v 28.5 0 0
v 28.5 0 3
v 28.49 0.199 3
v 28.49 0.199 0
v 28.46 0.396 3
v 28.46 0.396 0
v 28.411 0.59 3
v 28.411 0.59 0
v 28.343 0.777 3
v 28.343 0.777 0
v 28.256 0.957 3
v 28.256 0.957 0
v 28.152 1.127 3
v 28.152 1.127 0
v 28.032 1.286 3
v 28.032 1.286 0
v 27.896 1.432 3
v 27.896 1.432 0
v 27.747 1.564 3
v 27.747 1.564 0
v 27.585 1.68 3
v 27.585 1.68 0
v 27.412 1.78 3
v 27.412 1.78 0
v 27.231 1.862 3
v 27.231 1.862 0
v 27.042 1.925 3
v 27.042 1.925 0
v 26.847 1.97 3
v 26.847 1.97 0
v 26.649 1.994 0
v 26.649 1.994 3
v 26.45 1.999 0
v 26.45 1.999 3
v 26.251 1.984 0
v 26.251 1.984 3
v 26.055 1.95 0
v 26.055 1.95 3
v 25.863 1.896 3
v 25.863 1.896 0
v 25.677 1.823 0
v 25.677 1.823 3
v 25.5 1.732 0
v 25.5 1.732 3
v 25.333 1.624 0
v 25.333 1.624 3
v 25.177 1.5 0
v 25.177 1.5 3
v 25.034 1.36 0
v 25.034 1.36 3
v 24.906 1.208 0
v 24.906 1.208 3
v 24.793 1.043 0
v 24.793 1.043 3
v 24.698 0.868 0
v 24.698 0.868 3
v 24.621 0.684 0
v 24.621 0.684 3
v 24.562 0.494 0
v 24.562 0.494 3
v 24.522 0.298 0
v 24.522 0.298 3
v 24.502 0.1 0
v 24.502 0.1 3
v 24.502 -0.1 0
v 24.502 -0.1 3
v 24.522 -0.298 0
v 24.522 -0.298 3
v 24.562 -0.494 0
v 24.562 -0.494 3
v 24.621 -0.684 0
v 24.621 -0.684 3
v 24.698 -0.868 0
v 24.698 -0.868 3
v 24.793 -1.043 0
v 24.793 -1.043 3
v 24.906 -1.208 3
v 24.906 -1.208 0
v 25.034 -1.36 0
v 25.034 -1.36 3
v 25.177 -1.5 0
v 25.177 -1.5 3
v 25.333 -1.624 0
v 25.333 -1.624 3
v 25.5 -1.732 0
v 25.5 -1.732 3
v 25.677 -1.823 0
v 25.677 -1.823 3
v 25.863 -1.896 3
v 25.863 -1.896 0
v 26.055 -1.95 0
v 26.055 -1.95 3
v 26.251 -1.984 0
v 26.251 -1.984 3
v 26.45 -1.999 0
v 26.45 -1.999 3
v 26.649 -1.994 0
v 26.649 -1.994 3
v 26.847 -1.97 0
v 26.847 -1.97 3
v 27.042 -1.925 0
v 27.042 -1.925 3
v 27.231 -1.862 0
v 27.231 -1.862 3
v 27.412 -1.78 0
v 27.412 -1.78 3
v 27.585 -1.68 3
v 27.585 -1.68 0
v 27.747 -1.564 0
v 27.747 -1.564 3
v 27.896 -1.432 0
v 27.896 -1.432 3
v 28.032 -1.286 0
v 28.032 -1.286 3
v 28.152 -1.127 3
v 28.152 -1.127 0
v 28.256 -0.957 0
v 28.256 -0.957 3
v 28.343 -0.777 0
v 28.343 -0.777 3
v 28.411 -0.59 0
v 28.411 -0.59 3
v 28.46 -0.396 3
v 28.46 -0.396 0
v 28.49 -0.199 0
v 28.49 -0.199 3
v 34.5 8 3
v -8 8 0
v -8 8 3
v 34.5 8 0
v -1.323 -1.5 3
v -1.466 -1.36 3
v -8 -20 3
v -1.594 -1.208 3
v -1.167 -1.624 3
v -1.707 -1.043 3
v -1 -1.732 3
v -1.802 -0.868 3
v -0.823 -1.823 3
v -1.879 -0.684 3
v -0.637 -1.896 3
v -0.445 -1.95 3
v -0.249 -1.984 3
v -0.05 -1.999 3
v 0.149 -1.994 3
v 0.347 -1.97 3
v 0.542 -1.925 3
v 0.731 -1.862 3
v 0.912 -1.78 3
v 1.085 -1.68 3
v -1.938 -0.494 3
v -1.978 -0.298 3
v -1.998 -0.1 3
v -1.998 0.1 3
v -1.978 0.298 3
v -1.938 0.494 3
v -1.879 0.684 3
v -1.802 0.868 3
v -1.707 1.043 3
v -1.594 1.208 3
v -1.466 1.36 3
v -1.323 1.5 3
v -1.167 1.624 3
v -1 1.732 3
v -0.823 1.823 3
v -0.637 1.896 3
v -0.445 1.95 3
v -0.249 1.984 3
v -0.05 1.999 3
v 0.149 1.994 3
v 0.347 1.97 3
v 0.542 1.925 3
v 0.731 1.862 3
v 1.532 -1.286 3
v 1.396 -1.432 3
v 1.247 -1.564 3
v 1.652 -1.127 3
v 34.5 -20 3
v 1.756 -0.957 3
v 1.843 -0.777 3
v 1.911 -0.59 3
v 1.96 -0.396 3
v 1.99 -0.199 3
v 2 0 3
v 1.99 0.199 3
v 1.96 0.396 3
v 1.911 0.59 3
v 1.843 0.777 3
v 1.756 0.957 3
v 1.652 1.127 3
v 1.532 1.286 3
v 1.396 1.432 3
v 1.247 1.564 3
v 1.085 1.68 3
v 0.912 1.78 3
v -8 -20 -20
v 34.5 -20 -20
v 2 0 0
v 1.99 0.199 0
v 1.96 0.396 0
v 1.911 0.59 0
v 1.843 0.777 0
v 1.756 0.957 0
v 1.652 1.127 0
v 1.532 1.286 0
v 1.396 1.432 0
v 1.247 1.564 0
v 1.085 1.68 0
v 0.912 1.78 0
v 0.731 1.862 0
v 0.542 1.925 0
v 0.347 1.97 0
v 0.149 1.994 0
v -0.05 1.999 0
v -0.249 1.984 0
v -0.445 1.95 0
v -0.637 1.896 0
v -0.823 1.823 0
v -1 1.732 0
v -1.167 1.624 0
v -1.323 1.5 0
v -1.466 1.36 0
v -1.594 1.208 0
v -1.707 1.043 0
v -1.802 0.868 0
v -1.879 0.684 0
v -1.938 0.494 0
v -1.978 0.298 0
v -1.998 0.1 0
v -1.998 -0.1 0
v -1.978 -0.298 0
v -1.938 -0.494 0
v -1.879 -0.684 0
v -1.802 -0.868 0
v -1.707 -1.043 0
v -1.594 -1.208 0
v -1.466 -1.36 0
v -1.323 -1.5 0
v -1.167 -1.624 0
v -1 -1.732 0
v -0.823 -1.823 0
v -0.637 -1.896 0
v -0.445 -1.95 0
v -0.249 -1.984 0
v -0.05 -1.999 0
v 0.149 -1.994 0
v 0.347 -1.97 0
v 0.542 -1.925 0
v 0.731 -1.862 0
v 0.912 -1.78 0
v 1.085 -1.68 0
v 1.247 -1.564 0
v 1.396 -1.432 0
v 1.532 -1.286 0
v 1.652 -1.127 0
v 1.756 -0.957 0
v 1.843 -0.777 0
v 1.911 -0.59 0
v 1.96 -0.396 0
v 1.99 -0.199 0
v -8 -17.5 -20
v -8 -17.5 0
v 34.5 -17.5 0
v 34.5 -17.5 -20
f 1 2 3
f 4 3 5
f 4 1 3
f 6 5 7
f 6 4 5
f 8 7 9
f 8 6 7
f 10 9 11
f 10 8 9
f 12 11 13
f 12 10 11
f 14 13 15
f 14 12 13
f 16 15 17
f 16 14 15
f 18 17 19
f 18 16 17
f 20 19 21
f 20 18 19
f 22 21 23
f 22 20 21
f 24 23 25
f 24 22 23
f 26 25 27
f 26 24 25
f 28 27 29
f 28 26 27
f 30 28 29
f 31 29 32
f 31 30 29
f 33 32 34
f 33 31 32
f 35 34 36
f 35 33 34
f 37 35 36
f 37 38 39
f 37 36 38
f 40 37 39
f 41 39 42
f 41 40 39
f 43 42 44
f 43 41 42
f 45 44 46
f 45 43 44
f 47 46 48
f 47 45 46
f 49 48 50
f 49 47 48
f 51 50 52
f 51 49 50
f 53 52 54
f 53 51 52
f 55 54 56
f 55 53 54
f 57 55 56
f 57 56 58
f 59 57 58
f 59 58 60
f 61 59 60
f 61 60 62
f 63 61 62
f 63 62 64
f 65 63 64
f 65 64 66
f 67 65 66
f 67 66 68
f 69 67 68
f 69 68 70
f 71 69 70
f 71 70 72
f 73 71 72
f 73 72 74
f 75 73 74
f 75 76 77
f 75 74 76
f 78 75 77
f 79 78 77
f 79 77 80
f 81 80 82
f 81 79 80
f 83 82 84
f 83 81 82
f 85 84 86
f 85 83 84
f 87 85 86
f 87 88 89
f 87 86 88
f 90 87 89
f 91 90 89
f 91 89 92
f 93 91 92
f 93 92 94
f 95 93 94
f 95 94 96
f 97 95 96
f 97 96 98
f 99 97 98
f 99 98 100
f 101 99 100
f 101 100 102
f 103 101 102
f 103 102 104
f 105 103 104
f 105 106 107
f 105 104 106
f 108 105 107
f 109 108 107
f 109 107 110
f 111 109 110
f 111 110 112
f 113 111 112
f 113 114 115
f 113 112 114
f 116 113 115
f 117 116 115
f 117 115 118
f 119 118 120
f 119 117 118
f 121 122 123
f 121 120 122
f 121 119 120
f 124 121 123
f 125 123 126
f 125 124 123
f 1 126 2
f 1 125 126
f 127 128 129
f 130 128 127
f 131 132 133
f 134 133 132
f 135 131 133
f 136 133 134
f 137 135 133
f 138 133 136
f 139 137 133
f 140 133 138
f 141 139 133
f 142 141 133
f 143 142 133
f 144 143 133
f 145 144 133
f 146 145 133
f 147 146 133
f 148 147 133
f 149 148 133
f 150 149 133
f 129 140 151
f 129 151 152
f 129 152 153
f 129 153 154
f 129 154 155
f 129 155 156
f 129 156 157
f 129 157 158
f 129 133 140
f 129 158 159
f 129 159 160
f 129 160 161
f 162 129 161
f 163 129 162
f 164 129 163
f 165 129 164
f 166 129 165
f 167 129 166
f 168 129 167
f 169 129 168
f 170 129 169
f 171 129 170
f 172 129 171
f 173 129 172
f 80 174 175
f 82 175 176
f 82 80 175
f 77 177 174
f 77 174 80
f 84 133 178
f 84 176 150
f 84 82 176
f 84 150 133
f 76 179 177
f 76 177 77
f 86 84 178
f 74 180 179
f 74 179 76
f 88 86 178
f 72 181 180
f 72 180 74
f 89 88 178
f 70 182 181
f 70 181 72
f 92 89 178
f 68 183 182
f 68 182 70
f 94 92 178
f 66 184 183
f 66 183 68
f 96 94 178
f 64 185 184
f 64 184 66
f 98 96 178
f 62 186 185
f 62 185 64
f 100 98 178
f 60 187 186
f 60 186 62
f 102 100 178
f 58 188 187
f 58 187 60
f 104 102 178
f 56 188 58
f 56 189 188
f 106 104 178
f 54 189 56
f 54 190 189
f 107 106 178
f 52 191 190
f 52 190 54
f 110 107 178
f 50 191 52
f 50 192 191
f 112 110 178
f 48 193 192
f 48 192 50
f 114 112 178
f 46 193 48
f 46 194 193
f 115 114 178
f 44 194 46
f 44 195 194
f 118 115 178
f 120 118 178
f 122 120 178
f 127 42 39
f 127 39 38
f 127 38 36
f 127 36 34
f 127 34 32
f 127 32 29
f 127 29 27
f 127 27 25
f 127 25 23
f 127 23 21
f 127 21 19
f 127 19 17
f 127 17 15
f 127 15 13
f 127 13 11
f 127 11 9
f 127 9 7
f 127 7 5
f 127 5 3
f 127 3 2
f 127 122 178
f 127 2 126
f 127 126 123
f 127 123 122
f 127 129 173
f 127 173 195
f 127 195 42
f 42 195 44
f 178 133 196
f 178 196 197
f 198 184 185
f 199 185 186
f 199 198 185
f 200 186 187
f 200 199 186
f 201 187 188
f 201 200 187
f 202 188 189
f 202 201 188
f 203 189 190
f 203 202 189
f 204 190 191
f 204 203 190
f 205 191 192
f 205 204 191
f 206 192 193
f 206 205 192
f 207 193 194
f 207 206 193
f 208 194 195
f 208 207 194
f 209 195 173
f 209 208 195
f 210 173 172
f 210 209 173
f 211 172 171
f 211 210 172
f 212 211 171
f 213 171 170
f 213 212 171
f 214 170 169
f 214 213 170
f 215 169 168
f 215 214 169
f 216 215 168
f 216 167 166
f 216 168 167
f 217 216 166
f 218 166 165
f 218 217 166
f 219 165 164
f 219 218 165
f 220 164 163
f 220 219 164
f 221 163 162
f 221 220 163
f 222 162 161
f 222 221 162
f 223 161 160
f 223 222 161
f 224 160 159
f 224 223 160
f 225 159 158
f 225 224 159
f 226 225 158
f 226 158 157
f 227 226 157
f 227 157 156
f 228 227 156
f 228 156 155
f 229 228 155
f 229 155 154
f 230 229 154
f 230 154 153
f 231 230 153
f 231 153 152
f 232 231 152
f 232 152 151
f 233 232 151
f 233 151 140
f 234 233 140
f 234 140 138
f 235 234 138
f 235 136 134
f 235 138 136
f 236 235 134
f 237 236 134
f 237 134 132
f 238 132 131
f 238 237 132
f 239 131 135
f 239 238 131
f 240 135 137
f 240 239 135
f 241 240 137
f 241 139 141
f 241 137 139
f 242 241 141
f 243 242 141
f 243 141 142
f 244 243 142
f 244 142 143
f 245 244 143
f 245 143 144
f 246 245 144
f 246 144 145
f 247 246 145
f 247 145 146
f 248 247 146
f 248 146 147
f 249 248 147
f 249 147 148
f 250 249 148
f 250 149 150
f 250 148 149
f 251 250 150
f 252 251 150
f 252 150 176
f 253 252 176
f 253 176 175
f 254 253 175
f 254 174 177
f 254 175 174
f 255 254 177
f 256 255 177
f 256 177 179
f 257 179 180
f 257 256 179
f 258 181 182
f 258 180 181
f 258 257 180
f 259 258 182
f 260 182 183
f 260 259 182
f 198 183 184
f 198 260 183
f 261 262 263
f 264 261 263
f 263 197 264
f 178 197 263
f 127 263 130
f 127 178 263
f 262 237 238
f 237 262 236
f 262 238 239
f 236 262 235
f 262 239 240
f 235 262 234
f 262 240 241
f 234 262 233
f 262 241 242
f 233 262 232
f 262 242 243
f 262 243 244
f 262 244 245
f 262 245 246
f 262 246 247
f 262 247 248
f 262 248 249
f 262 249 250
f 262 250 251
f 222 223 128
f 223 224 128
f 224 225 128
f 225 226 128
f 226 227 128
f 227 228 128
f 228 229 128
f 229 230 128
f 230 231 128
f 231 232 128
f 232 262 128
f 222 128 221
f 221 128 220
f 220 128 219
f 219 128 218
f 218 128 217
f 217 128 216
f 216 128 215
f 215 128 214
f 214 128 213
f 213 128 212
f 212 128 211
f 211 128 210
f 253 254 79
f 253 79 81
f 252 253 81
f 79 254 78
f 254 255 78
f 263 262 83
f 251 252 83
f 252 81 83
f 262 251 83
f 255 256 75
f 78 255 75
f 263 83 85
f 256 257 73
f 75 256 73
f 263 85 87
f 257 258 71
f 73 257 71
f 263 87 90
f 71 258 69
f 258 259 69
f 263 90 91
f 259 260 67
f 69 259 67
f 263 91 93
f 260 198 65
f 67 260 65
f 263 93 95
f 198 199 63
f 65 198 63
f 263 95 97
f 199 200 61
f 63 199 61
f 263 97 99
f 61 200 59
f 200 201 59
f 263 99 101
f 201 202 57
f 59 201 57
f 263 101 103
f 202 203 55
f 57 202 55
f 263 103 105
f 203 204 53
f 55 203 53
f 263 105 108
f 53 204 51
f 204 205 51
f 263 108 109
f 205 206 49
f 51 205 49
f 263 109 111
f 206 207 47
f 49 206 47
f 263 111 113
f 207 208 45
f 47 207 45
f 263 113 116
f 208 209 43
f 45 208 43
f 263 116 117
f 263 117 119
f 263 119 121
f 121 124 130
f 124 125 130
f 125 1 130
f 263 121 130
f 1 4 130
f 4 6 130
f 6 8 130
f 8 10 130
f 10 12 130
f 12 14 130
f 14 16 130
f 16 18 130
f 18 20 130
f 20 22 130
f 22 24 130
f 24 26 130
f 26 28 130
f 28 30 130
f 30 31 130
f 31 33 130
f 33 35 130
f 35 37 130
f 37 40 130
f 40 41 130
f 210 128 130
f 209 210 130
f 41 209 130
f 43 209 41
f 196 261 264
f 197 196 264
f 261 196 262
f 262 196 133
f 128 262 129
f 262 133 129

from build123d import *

# Parameters (mm, degrees)
SKETCH002_W     = 42.5
SKETCH002_H     = 28
PAD_DEPTH       = 3
SKETCH_R        = 2
POCKET_DEPTH    = 5
SKETCH001_R     = 2
POCKET001_DEPTH = 5
SKETCH003_W     = 42.5
SKETCH003_H     = 2.5
PAD001_DEPTH    = 20


with BuildPart() as part:
    # Sketch002 → Pad (new body)
    with BuildSketch(Plane.XY):
        with Locations((13.25, -6)):
            Rectangle(SKETCH002_W, SKETCH002_H)
    extrude(amount=PAD_DEPTH)

    # Sketch → Pocket (cut)
    with BuildSketch(Plane.XY):
        Circle(SKETCH_R)
    extrude(amount=POCKET_DEPTH, mode=Mode.SUBTRACT)

    # Sketch001 → Pocket001 (cut)
    with BuildSketch(Plane.XY):
        with Locations((26.5, 0)):
            Circle(SKETCH001_R)
    extrude(amount=POCKET001_DEPTH, mode=Mode.SUBTRACT)

    # Sketch003 → Pad001 (join)
    with BuildSketch(Plane.XY):
        with Locations((13.25, -18.75)):
            Rectangle(SKETCH003_W, SKETCH003_H)
    extrude(amount=-PAD001_DEPTH)


solid = part.part
